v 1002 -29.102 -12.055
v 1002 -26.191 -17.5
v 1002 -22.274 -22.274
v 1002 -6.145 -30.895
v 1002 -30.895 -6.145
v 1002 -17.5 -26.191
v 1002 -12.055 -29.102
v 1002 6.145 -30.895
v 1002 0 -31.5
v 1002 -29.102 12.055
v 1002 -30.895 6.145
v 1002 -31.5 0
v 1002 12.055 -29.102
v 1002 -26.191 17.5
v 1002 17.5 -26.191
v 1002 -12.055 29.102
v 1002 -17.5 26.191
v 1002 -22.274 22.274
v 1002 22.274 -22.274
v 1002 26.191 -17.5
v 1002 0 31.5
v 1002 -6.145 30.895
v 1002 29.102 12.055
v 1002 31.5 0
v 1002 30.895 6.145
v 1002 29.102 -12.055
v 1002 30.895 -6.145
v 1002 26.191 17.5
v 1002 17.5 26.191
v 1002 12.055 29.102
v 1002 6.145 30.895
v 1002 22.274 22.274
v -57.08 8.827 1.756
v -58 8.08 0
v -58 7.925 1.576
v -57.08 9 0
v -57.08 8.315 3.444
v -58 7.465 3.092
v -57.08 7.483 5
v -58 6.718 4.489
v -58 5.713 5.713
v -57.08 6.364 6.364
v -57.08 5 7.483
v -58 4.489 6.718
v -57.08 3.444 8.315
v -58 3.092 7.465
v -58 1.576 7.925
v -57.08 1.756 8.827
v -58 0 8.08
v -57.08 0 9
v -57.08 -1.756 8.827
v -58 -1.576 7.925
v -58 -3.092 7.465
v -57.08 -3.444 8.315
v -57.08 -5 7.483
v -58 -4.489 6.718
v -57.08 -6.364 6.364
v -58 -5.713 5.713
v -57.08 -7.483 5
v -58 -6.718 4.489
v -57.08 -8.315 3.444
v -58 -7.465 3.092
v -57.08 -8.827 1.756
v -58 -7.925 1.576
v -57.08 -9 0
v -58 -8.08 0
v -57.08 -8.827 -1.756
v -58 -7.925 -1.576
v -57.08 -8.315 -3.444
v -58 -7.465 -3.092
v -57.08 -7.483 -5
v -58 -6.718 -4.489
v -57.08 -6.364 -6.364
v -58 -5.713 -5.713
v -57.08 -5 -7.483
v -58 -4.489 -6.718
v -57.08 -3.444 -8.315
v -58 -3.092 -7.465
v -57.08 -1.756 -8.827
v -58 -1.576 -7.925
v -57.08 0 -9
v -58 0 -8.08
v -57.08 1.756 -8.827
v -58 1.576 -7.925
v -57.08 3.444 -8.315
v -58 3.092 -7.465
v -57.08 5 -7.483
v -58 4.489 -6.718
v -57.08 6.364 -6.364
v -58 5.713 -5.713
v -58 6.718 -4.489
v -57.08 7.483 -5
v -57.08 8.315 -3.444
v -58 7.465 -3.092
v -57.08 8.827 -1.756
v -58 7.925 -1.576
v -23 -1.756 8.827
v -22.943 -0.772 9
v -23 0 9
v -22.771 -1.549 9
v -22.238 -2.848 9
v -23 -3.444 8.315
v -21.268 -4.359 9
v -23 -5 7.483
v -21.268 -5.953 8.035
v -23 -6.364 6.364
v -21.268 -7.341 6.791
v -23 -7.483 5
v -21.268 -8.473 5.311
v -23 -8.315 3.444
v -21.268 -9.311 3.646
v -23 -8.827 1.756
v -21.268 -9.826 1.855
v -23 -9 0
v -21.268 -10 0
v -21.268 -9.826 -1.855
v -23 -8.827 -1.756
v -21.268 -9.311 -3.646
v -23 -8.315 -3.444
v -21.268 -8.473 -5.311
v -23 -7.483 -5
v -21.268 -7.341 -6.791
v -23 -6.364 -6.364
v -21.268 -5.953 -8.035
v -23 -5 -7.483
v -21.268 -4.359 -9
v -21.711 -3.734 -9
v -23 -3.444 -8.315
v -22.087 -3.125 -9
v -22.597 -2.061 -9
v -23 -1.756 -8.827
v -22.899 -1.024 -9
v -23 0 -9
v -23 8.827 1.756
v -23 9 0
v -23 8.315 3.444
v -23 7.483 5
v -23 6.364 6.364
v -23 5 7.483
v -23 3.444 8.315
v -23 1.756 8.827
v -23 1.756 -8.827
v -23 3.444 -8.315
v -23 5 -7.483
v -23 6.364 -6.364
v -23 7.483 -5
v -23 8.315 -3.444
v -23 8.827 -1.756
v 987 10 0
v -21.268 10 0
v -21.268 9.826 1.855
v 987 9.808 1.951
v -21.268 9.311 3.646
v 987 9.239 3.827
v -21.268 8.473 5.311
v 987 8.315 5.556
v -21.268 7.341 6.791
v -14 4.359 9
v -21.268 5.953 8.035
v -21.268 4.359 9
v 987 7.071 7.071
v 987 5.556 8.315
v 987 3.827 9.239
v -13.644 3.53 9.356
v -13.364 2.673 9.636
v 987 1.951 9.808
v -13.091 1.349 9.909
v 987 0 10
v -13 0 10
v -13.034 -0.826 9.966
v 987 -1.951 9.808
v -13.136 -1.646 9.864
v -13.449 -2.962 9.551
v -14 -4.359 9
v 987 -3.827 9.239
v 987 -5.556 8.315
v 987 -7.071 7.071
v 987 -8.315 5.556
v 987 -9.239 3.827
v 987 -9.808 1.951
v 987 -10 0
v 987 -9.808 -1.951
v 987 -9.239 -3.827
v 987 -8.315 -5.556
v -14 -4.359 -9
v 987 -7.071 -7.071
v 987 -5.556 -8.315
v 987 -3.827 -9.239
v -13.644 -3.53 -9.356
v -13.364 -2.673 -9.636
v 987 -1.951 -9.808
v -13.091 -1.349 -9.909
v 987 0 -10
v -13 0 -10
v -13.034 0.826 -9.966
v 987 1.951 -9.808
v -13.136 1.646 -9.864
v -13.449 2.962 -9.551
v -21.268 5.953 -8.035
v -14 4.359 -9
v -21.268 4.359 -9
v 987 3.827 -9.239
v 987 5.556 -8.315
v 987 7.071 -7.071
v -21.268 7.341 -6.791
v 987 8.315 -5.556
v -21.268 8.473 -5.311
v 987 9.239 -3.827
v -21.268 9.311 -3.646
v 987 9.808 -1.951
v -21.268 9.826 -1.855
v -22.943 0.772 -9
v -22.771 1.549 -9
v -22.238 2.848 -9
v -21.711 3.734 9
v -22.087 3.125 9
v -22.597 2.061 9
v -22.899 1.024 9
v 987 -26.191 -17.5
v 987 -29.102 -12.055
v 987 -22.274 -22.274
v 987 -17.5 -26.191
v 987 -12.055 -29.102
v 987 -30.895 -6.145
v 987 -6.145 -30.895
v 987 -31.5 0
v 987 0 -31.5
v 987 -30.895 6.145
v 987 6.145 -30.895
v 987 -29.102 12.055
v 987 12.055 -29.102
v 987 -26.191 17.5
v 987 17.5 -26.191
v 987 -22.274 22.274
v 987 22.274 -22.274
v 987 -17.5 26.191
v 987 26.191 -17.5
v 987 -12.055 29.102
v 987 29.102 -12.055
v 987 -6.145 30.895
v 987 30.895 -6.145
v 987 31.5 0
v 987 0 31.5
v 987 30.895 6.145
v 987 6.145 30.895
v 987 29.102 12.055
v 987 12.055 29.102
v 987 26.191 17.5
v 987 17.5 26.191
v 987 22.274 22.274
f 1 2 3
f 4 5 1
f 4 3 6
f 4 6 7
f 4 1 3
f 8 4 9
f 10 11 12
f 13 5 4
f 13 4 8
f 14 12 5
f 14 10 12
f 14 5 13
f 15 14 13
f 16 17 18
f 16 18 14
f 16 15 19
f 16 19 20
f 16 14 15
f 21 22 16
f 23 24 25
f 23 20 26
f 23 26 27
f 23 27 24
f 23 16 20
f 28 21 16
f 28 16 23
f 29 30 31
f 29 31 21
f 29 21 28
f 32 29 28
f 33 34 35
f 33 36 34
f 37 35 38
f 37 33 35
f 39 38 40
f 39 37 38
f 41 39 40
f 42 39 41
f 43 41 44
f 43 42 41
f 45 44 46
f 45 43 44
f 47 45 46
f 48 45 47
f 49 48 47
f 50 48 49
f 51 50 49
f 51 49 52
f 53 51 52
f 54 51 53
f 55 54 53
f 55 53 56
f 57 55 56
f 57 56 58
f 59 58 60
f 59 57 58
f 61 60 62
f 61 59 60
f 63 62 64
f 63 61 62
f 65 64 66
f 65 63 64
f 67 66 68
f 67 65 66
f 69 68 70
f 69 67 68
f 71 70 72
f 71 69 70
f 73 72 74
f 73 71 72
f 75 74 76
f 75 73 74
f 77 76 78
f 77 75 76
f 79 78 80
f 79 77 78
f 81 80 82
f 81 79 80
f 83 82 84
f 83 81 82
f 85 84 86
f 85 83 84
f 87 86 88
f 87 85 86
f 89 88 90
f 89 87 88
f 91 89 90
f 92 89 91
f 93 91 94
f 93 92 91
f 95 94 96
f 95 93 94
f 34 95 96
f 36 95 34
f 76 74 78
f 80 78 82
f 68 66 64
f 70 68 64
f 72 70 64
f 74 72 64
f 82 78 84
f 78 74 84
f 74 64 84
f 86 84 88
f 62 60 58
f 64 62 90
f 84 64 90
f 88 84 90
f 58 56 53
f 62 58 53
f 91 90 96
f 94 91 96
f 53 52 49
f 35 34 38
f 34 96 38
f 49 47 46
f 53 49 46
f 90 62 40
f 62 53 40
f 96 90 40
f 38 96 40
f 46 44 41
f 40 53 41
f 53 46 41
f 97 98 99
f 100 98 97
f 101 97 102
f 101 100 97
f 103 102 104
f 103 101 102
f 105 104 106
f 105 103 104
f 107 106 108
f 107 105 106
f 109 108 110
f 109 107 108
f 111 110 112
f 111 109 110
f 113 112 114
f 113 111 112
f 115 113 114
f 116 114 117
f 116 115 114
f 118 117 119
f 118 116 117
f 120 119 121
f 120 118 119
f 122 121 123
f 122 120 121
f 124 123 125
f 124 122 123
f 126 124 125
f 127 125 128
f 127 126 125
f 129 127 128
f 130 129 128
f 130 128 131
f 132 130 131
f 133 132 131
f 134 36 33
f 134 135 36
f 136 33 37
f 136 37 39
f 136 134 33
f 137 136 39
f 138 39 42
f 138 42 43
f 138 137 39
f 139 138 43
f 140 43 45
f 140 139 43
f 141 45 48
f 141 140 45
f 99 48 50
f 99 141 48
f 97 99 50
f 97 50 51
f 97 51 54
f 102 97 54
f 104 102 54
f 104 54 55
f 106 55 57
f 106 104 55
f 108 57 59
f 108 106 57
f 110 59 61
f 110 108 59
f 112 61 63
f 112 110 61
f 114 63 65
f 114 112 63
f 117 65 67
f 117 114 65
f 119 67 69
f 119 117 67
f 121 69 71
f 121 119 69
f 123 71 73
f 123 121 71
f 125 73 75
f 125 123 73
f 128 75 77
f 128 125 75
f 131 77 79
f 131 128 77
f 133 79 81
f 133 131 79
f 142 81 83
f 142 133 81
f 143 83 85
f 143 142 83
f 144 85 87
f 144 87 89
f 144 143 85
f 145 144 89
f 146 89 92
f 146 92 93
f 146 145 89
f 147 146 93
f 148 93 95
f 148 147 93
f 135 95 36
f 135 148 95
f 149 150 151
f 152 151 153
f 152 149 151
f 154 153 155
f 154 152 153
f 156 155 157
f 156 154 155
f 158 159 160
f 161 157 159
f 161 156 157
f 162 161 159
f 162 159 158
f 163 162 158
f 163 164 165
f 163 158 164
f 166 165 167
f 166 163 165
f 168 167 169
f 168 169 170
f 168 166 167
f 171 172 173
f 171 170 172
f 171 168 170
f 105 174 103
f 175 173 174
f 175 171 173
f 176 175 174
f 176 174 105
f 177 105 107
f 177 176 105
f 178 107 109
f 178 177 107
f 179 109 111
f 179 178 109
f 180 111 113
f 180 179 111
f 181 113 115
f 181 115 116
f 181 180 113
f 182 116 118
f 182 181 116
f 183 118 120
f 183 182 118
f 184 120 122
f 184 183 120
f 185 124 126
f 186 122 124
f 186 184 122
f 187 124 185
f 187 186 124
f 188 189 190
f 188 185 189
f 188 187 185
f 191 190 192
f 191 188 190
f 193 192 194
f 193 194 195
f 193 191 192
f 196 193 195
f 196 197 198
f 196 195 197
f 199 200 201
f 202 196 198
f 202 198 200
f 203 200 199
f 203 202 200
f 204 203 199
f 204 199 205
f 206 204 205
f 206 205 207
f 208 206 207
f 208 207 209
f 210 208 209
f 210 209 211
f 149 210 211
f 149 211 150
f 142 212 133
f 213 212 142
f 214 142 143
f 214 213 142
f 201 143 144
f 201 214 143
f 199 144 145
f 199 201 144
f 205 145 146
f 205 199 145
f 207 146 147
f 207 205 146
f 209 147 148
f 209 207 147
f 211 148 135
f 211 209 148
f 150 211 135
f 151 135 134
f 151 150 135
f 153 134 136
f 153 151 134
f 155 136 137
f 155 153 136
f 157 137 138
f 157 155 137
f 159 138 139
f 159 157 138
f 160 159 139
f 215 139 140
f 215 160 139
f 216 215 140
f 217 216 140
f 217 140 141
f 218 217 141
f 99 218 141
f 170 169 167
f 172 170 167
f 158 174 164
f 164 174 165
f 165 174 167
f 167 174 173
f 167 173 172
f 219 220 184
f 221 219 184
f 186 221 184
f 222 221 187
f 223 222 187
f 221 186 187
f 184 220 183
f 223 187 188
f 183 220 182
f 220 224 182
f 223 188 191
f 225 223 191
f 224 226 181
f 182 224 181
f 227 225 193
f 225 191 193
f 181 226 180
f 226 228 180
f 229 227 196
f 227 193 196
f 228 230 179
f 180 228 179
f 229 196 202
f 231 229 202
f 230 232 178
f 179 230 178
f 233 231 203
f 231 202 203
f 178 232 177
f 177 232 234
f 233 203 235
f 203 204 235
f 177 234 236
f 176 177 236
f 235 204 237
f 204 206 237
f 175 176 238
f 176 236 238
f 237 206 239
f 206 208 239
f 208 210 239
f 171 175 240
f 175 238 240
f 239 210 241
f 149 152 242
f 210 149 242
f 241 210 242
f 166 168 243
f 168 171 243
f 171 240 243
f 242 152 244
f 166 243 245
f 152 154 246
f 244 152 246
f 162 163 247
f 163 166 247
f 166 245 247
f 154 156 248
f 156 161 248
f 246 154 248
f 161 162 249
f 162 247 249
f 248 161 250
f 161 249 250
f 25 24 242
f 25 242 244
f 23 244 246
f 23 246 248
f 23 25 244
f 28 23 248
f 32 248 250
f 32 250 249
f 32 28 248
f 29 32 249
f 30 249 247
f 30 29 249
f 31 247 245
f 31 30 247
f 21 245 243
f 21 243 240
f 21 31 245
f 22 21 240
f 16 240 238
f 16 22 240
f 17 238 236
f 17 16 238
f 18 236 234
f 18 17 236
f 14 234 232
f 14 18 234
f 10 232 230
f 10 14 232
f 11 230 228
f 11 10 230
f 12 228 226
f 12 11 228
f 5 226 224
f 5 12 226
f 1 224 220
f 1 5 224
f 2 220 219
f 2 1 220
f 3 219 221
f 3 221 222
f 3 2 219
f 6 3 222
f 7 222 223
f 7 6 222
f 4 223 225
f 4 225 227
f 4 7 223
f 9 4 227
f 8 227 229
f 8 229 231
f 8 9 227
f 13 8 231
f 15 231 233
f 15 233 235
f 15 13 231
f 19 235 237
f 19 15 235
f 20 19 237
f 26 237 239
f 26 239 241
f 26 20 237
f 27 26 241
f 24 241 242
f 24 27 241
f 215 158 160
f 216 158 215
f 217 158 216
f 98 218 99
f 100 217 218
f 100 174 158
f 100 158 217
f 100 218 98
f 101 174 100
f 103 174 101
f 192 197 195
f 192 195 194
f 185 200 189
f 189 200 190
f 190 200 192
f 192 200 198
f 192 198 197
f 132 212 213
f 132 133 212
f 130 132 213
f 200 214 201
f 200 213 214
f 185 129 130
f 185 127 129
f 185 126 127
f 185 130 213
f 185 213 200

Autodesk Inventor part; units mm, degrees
sketch "Sketch_1" plane through (0, 0, 0) normal (0, 0, 1) x (1, 0, 0)
  line L0 (1002, 0) -> (-58, 0)
  line L1 (-58, 0) -> (-58, 8.08)
  line L2 (-58, 8.08) -> (-57.08, 9)
  line L3 (-57.08, 9) -> (-23, 9)
  line L4 (-23, 9) -> (-21.2679, 10)
  line L5 (-21.2679, 10) -> (987, 10)
  line L6 (987, 10) -> (987, 31.5)
  line L7 (987, 31.5) -> (1002, 31.5)
  line L8 (1002, 31.5) -> (1002, 0)
  line L9 (1002, 0) -> (-58, 0)
revolve "Revolution1" add sketch "Sketch_1" angle 360 about axis through (1002, 0, 0) along (1, 0, 0)
thread "Thread1" size "M18x1.5" class "6g" standard "ISO Metric profile" length 31.08
sketch "Sketch_2" plane through (0, 0, 0) normal (0, 1, 0) x (-1, 0, 0)
  line L0 (23, -10) -> (23, -9)
  line L1 (23, -9) -> (14, -9)
  line L2 (14, -9) -> (13, -10)
  line L3 (13, -10) -> (23, -10)
extrude "Extrusion1" cut sketch "Sketch_2" along normal mid plane 20
sketch "Sketch_3" plane through (0, 0, 0) normal (0, 1, 0) x (-1, 0, 0)
  line L0 (23, 10) -> (13, 10)
  line L1 (13, 10) -> (14, 9)
  line L2 (14, 9) -> (23, 9)
  line L3 (23, 9) -> (23, 10)
extrude "Extrusion2" cut sketch "Sketch_3" along normal mid plane 20
ref_plane "K_XY" through (-14, 0, 0) normal (0, 0, 1) x (1, 0, 0)
ref_plane "K_YZ" through (-14, 0, 0) normal (1, 0, 0) x (0, 1, 0)
ref_plane "K_ZX" through (-14, 0, 0) normal (0, 1, 0) x (0, 0, 1)
ref_plane "rod_XY" through (0, 0, 0) normal (1, 0, 0) x (0, 0, -1)
ref_plane "rod_YZ" through (0, 0, 0) normal (0, 0, -1) x (0, 1, 0)
ref_plane "rod_ZX" through (0, 0, 0) normal (0, 1, 0) x (1, 0, 0)
ref_plane "rod_nut_XY" through (-42, 0, 0) normal (-1, 0, 0) x (0, 0, -1)
ref_plane "rod_nut_YZ" through (-42, 0, 0) normal (0, 0, -1) x (0, -1, 0)
ref_plane "rod_nut_ZX" through (-42, 0, 0) normal (0, -1, 0) x (-1, 0, 0)
properties part number "CE263-800_ROD"
